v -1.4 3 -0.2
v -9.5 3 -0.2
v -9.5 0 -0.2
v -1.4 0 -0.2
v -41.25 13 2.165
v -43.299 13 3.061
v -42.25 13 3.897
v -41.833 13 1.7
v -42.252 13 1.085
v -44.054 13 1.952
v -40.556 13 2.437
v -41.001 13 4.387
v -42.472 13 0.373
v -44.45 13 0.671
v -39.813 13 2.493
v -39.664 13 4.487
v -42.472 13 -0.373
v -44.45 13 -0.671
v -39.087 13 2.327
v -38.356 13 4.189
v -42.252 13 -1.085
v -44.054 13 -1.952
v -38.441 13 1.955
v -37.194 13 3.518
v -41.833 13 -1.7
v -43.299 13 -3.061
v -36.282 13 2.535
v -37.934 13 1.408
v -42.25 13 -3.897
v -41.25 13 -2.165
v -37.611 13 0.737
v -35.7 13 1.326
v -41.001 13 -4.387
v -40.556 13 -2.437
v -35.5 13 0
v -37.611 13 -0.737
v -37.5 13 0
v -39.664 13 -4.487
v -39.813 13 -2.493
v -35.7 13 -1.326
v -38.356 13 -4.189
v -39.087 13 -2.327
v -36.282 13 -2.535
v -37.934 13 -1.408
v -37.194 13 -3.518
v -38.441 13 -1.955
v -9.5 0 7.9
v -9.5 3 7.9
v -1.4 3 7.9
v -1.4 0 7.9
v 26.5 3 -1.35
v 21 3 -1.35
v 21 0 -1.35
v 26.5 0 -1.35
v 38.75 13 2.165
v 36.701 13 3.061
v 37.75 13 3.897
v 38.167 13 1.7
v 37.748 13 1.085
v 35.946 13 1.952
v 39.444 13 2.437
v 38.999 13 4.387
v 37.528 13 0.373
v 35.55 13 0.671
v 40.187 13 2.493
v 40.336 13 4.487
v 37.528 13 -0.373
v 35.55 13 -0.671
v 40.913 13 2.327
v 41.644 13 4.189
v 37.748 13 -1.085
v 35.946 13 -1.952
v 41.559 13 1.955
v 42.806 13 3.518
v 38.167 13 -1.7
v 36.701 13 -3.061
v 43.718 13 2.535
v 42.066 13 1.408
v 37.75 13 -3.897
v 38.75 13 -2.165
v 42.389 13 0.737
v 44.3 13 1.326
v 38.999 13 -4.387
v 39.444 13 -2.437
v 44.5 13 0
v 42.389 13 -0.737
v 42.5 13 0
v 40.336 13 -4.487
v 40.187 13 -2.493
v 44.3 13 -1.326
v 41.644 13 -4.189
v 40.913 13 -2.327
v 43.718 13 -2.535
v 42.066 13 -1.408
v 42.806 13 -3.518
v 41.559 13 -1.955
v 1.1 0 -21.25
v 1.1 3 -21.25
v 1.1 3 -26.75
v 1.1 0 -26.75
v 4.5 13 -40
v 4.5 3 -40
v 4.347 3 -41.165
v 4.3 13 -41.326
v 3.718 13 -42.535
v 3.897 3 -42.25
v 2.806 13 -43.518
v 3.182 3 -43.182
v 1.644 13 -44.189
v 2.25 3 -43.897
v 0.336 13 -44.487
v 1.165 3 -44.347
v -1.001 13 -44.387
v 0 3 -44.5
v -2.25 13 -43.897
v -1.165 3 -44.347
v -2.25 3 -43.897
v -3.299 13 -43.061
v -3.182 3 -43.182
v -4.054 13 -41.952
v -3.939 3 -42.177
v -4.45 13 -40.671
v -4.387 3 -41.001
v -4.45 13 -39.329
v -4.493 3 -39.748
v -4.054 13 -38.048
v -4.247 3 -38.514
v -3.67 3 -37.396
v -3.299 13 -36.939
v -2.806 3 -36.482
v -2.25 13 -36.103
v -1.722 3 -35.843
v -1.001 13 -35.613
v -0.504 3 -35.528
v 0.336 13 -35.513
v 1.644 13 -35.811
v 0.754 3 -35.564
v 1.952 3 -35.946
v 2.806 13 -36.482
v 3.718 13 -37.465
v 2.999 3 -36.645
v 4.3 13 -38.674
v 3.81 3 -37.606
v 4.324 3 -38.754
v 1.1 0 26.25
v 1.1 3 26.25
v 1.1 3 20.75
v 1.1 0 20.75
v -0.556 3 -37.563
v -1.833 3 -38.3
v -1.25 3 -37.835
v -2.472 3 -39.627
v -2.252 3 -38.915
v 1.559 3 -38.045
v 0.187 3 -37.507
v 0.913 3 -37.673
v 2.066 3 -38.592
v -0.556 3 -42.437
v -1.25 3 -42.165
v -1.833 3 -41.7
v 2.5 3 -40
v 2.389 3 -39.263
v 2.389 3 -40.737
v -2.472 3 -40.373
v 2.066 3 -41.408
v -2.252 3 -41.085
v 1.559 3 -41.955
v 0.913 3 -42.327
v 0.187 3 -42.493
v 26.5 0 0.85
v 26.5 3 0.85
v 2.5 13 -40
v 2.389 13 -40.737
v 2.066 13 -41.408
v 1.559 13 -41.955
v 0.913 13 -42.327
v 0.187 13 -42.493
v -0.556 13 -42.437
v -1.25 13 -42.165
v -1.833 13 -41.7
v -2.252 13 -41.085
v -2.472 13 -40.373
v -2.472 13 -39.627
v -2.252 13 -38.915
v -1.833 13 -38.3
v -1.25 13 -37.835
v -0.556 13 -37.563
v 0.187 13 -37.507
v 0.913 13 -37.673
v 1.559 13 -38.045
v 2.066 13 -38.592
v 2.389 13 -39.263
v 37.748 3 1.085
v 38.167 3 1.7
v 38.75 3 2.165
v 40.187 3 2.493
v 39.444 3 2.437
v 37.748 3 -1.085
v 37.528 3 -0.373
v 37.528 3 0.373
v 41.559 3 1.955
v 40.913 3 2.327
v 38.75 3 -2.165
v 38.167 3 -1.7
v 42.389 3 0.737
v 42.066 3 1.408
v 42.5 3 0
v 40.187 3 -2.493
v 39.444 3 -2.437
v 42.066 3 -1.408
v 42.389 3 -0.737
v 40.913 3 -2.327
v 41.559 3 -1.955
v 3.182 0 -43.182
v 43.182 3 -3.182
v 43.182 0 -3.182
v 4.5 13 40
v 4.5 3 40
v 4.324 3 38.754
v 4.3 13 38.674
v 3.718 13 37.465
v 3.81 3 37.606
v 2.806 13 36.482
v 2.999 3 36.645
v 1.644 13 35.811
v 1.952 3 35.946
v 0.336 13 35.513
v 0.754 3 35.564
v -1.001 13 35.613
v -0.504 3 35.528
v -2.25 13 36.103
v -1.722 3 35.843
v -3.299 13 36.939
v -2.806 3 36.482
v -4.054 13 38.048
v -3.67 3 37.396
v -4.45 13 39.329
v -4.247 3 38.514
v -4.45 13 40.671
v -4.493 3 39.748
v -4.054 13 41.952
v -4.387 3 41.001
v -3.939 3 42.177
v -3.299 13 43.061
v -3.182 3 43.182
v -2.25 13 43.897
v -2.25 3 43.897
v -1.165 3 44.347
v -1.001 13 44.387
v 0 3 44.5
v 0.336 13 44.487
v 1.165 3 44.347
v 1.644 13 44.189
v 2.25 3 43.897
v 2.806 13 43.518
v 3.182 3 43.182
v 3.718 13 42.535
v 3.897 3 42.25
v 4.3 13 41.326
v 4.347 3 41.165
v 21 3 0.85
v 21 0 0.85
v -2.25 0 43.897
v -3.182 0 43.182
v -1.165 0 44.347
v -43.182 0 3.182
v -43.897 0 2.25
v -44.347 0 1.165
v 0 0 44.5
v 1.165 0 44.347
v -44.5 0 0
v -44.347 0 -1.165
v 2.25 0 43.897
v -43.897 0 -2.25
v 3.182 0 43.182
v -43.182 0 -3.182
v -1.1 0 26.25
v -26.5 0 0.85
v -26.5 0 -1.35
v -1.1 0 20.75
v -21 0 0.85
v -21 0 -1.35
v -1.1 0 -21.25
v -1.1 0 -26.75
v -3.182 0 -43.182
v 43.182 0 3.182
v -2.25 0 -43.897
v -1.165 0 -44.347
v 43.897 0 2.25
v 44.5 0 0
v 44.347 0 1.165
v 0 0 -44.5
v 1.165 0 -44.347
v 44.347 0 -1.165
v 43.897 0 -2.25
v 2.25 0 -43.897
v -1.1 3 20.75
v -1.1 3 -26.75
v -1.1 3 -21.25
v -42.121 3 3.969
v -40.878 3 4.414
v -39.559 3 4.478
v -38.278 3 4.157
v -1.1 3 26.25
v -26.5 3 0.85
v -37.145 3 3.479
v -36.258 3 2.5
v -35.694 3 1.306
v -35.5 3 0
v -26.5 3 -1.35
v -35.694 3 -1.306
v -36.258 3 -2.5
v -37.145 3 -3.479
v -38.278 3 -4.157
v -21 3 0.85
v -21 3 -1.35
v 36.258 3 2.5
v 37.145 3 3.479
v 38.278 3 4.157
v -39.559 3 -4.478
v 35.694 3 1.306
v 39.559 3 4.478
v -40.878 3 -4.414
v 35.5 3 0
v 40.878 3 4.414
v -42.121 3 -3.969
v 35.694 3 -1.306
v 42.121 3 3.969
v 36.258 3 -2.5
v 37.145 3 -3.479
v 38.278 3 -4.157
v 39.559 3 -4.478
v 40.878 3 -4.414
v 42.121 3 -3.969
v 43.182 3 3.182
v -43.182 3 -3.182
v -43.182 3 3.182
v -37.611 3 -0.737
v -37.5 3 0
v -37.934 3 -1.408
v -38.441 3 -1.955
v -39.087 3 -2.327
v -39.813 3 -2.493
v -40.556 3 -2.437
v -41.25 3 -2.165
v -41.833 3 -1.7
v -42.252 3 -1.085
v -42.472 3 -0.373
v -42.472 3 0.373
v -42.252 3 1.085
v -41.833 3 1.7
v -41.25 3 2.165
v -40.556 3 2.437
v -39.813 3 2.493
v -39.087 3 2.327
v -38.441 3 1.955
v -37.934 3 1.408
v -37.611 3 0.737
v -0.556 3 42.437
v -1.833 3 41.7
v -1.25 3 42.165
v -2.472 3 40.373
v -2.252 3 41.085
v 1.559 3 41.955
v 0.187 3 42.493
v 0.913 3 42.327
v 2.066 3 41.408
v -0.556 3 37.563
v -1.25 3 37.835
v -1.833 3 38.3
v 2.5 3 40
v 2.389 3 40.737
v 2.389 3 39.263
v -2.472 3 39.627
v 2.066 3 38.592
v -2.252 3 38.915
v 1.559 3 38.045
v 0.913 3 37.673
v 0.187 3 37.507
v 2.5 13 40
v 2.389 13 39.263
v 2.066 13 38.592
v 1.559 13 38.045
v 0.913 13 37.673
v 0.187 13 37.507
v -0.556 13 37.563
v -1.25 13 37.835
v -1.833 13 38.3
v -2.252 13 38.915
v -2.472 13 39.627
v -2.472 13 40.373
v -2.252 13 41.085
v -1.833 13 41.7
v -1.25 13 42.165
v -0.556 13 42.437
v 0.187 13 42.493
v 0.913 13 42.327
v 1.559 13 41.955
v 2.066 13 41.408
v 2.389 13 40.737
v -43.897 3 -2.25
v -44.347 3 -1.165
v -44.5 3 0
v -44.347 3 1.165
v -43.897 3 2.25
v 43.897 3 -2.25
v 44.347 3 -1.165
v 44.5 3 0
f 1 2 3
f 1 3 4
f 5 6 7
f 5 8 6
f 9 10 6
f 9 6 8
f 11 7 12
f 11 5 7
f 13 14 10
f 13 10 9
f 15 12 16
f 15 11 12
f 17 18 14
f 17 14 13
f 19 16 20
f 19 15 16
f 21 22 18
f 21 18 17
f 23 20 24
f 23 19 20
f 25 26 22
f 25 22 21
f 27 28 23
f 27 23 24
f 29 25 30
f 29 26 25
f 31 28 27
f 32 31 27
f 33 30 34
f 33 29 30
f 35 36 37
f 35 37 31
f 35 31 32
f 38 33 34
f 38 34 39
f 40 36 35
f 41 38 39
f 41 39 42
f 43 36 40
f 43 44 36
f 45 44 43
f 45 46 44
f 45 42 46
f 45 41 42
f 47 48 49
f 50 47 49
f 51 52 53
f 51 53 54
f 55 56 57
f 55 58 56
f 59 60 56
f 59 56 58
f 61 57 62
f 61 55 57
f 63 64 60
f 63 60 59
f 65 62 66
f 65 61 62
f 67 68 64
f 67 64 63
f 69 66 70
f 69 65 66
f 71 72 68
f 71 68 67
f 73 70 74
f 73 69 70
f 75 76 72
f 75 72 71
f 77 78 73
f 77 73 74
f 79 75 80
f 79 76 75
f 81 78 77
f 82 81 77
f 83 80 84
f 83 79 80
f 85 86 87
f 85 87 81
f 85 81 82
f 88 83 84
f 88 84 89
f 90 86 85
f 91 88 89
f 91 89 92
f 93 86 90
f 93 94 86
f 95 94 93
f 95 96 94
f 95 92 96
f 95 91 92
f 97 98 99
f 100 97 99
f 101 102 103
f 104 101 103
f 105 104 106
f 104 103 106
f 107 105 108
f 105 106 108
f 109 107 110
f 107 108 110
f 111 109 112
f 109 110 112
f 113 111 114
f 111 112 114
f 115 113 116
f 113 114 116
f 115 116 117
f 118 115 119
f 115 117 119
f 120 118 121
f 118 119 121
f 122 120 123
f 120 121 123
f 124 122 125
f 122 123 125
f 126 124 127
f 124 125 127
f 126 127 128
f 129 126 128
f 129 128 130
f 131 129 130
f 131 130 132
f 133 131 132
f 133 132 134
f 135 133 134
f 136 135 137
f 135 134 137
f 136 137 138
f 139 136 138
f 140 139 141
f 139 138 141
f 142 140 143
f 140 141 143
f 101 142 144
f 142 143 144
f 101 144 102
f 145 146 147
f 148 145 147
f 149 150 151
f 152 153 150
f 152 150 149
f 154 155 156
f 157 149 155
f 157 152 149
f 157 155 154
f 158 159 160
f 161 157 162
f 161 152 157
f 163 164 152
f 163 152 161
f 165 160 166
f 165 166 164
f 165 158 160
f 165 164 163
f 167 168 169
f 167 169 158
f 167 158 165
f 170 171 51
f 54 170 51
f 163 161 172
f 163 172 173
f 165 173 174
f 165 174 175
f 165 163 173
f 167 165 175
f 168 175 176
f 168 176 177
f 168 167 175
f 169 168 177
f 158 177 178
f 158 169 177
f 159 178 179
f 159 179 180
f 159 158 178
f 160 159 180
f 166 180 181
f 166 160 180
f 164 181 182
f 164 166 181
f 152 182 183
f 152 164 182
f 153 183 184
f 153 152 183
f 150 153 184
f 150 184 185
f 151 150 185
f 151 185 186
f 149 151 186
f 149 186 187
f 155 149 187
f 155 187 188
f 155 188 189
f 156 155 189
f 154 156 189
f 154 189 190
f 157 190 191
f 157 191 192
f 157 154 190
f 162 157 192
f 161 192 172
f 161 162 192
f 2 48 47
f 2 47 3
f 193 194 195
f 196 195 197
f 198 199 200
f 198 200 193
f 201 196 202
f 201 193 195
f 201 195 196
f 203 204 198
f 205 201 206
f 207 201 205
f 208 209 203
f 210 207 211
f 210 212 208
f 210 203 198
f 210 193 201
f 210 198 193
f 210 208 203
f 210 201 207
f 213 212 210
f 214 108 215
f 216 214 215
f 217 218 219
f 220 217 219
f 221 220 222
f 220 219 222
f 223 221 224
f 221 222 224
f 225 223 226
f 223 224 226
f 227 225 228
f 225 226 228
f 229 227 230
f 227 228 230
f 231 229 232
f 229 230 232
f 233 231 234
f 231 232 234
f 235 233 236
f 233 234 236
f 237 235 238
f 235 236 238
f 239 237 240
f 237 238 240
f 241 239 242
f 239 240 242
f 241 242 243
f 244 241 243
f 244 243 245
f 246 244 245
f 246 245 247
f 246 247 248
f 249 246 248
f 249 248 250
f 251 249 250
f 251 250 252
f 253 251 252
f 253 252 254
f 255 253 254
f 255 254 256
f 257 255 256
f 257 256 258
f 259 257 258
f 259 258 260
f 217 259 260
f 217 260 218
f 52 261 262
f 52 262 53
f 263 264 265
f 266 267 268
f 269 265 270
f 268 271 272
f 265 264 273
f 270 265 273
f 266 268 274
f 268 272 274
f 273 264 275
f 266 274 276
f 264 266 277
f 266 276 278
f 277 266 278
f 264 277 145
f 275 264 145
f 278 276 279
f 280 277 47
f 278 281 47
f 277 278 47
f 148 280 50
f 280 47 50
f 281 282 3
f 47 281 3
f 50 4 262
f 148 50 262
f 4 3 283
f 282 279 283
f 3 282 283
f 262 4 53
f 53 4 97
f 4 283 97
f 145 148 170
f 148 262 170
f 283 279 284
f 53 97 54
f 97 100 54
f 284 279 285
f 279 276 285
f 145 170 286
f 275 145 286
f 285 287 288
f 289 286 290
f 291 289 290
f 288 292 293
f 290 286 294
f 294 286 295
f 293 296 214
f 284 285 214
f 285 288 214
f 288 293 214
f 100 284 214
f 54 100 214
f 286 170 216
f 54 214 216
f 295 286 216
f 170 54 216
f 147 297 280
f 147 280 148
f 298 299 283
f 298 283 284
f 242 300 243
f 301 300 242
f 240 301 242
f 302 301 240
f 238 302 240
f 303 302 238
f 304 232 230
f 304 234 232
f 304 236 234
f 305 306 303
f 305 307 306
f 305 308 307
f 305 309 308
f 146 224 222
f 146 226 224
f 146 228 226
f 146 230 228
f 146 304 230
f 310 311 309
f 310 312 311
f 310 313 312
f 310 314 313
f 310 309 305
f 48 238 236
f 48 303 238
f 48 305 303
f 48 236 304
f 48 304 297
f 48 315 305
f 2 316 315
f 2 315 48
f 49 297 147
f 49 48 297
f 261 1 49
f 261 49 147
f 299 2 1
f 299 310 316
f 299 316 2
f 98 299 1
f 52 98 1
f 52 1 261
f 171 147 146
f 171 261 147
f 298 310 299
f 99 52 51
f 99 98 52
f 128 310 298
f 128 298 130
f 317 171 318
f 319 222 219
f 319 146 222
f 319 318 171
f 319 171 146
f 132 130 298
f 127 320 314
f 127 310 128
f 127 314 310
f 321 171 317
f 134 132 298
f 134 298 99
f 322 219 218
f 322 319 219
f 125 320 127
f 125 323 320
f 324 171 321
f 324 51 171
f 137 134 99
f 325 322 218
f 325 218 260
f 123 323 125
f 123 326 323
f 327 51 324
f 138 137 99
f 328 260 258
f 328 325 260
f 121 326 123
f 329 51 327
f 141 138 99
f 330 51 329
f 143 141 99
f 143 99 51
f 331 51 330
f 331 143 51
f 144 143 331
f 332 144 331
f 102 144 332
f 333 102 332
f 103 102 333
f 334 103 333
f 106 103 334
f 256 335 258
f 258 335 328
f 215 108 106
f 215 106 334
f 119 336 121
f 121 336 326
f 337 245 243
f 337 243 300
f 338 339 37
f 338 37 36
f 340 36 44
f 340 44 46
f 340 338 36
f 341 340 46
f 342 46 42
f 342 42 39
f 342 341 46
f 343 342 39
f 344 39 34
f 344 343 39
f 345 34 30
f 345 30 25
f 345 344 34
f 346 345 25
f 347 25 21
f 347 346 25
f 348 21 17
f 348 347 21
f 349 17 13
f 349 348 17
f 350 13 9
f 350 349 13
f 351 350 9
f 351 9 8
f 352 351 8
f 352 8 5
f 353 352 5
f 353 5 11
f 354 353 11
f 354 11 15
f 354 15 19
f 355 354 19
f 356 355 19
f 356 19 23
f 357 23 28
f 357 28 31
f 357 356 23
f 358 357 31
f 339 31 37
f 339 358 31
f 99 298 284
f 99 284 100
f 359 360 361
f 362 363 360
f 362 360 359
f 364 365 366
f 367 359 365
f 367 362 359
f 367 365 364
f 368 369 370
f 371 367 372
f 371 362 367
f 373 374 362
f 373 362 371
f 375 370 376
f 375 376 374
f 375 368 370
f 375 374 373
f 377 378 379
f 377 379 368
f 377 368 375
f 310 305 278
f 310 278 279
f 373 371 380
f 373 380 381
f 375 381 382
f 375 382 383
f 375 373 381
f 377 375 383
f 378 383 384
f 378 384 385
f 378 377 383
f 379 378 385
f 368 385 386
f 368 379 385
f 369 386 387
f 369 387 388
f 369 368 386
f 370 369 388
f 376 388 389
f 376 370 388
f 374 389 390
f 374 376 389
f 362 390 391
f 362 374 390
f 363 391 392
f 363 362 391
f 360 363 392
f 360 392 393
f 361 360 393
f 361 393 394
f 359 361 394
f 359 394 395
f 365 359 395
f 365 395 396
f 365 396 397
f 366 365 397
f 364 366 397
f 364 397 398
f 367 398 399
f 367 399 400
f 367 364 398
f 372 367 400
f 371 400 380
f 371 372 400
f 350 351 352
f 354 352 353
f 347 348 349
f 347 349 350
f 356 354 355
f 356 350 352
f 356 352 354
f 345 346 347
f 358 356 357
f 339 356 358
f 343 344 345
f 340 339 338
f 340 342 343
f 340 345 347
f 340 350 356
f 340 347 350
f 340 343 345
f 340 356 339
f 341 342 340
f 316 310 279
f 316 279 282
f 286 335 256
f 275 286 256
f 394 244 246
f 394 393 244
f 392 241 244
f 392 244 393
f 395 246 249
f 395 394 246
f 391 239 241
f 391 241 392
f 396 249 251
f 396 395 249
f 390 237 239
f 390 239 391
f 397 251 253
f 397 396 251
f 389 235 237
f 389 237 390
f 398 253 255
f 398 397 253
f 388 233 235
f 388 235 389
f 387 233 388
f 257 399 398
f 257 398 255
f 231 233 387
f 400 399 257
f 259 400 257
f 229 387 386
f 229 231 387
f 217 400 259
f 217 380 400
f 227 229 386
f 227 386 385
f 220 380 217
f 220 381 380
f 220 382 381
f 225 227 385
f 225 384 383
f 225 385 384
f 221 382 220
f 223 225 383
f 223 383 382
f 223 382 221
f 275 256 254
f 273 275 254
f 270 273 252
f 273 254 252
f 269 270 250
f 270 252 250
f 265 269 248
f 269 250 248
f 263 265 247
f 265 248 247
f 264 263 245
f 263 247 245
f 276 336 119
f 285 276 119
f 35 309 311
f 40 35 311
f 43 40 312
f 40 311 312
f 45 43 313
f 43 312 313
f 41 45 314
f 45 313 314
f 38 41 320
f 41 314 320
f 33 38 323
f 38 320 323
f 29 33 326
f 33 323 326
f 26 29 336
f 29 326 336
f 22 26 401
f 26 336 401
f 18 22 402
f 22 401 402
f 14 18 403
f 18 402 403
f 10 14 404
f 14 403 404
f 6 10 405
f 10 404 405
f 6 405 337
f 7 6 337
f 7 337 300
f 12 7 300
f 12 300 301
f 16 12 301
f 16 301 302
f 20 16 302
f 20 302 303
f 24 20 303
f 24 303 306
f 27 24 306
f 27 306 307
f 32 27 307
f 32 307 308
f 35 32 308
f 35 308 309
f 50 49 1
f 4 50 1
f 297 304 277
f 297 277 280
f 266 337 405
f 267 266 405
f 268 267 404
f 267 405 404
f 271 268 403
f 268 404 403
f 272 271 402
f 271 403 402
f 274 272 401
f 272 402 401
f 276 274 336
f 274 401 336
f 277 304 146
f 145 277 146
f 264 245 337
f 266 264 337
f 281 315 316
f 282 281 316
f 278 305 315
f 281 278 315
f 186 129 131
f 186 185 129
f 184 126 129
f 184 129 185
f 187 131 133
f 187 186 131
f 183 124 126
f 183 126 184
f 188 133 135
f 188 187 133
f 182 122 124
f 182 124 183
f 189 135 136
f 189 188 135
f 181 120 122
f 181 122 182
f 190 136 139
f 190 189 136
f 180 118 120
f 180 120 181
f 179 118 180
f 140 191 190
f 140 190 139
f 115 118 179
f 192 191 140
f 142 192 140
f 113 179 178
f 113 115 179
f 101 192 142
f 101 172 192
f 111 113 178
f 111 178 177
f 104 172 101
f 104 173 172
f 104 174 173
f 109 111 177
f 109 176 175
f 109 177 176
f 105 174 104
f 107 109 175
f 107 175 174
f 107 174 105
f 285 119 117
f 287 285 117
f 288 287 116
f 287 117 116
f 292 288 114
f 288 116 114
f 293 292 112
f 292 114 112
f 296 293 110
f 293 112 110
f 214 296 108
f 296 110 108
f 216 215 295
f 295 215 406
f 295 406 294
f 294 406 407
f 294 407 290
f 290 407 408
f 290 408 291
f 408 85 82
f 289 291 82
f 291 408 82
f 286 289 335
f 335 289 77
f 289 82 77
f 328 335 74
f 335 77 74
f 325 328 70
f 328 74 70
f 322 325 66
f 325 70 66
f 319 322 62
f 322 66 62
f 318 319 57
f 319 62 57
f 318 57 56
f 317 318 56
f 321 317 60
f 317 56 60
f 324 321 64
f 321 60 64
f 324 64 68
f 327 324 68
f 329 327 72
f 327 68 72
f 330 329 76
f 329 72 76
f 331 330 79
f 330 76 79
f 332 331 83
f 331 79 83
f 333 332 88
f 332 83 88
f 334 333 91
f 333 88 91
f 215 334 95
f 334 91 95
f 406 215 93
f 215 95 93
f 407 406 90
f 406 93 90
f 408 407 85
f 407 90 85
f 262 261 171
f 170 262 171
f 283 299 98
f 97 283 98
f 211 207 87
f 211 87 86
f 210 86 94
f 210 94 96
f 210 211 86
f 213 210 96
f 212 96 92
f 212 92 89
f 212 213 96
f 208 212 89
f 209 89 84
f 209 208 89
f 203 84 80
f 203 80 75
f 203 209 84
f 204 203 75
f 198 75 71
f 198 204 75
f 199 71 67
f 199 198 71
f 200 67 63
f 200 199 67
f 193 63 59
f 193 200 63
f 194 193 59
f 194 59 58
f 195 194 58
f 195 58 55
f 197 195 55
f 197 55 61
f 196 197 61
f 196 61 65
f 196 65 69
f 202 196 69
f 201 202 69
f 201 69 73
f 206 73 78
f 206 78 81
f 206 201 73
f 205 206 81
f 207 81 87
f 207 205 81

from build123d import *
from build123d.topology import SkipClean

# Parameters (mm, degrees)
SKETCH1_W           = 100
SKETCH1_H           = 100
BOSS_EXTRUDE1_DEPTH = 3
SKETCH2_R           = 4.5
SKETCH2_R_2         = 2.5
BOSS_EXTRUDE2_DEPTH = 10
SKETCH9_OUTSIDE_W   = 130.404
SKETCH9_OUTSIDE_H   = 130.404
CUT_EXTRUDE5_DEPTH  = 127
SKETCH11_W          = 8.1
SKETCH11_H          = 8.1
CUT_EXTRUDE6_DEPTH  = 127
SKETCH3_W           = 5.499999922
SKETCH3_H           = 2.2
SKETCH3_W_2         = 2.2
SKETCH3_H_2         = 5.499999922
CUT_EXTRUDE7_DEPTH  = 64.722052698


with BuildPart() as part:
    # Sketch1 → Boss-Extrude1 (new body)
    with BuildSketch(Plane(origin=(0, 0, 0), x_dir=(1, 0, 0), z_dir=(0, 1, 0))):
        Rectangle(SKETCH1_W, SKETCH1_H)
    extrude(amount=BOSS_EXTRUDE1_DEPTH)

    # Sketch2 → Boss-Extrude2 (add)
    # profile 1 of 4: a face of its own
    with BuildSketch(Plane(origin=(0, 3, 0), x_dir=(1, 0, 0), z_dir=(0, 1, 0))):
        with Locations((0, 40)):
            Circle(SKETCH2_R)
        with Locations((0, 40)):
            Circle(SKETCH2_R_2, mode=Mode.SUBTRACT)
    # profile 2 of 4: a face of its own
    with BuildSketch(Plane(origin=(0, 3, 0), x_dir=(1, 0, 0), z_dir=(0, 1, 0))):
        with Locations((40, 0)):
            Circle(SKETCH2_R)
        with Locations((40, 0)):
            Circle(SKETCH2_R_2, mode=Mode.SUBTRACT)
    # profile 3 of 4: a face of its own
    with BuildSketch(Plane(origin=(0, 3, 0), x_dir=(1, 0, 0), z_dir=(0, 1, 0))):
        with Locations((0, -40)):
            Circle(SKETCH2_R)
        with Locations((0, -40)):
            Circle(SKETCH2_R_2, mode=Mode.SUBTRACT)
    # profile 4 of 4: a face of its own
    with BuildSketch(Plane(origin=(0, 3, 0), x_dir=(1, 0, 0), z_dir=(0, 1, 0))):
        with Locations((-40, 0)):
            Circle(SKETCH2_R)
        with Locations((-40, 0)):
            Circle(SKETCH2_R_2, mode=Mode.SUBTRACT)
    extrude(amount=BOSS_EXTRUDE2_DEPTH)

    # Sketch9 outside → Cut-Extrude5 (cut)
    with BuildSketch(Plane(origin=(0, 3, 0), x_dir=(1, 0, 0), z_dir=(0, 1, 0))):
        Rectangle(SKETCH9_OUTSIDE_W, SKETCH9_OUTSIDE_H)
        with BuildLine():
            Line((3.181980515, 43.181980515), (43.181980515, 3.181980515))
            ThreePointArc((43.181980515, 3.181980515), (44.5, 0), (43.181980515, -3.181980515))
            Line((43.181980515, -3.181980515), (3.181980515, -43.181980515))
            ThreePointArc((3.181980515, -43.181980515), (0, -44.5), (-3.181980515, -43.181980515))
            Line((-3.181980515, -43.181980515), (-43.181980515, -3.181980515))
            ThreePointArc((-43.181980515, -3.181980515), (-44.5, 0), (-43.181980515, 3.181980515))
            Line((-43.181980515, 3.181980515), (-3.181980515, 43.181980515))
            ThreePointArc((-3.181980515, 43.181980515), (0, 44.5), (3.181980515, 43.181980515))
        make_face(mode=Mode.SUBTRACT)
    extrude(amount=-CUT_EXTRUDE5_DEPTH, mode=Mode.SUBTRACT)

    # Sketch11 → Cut-Extrude6 (cut)
    with SkipClean():  # the faces are left unmerged after this step: merging them gives an invalid solid
        with BuildSketch(Plane(origin=(0, 3, 0), x_dir=(1, 0, 0), z_dir=(0, 1, 0))):
            with Locations((-5.45, -3.85)):
                Rectangle(SKETCH11_W, SKETCH11_H)
        extrude(amount=-CUT_EXTRUDE6_DEPTH, mode=Mode.SUBTRACT)

    # Sketch3 → Cut-Extrude7 (cut, through all)
    with SkipClean():  # the faces are left unmerged after this step: merging them gives an invalid solid
        with BuildSketch(Plane(origin=(0, 3, 0), x_dir=(1, 0, 0), z_dir=(0, 1, 0))):
            with Locations((23.749999998, 0.250000008)):
                Rectangle(SKETCH3_W, SKETCH3_H)
            with Locations((0, 24.000000006)):
                Rectangle(SKETCH3_W_2, SKETCH3_H_2)
            with Locations((0, -23.49999999)):
                Rectangle(SKETCH3_W_2, SKETCH3_H_2)
            with Locations((-23.749999998, 0.250000008)):
                Rectangle(SKETCH3_W, SKETCH3_H)
        extrude(amount=-CUT_EXTRUDE7_DEPTH, mode=Mode.SUBTRACT)


solid = part.part
